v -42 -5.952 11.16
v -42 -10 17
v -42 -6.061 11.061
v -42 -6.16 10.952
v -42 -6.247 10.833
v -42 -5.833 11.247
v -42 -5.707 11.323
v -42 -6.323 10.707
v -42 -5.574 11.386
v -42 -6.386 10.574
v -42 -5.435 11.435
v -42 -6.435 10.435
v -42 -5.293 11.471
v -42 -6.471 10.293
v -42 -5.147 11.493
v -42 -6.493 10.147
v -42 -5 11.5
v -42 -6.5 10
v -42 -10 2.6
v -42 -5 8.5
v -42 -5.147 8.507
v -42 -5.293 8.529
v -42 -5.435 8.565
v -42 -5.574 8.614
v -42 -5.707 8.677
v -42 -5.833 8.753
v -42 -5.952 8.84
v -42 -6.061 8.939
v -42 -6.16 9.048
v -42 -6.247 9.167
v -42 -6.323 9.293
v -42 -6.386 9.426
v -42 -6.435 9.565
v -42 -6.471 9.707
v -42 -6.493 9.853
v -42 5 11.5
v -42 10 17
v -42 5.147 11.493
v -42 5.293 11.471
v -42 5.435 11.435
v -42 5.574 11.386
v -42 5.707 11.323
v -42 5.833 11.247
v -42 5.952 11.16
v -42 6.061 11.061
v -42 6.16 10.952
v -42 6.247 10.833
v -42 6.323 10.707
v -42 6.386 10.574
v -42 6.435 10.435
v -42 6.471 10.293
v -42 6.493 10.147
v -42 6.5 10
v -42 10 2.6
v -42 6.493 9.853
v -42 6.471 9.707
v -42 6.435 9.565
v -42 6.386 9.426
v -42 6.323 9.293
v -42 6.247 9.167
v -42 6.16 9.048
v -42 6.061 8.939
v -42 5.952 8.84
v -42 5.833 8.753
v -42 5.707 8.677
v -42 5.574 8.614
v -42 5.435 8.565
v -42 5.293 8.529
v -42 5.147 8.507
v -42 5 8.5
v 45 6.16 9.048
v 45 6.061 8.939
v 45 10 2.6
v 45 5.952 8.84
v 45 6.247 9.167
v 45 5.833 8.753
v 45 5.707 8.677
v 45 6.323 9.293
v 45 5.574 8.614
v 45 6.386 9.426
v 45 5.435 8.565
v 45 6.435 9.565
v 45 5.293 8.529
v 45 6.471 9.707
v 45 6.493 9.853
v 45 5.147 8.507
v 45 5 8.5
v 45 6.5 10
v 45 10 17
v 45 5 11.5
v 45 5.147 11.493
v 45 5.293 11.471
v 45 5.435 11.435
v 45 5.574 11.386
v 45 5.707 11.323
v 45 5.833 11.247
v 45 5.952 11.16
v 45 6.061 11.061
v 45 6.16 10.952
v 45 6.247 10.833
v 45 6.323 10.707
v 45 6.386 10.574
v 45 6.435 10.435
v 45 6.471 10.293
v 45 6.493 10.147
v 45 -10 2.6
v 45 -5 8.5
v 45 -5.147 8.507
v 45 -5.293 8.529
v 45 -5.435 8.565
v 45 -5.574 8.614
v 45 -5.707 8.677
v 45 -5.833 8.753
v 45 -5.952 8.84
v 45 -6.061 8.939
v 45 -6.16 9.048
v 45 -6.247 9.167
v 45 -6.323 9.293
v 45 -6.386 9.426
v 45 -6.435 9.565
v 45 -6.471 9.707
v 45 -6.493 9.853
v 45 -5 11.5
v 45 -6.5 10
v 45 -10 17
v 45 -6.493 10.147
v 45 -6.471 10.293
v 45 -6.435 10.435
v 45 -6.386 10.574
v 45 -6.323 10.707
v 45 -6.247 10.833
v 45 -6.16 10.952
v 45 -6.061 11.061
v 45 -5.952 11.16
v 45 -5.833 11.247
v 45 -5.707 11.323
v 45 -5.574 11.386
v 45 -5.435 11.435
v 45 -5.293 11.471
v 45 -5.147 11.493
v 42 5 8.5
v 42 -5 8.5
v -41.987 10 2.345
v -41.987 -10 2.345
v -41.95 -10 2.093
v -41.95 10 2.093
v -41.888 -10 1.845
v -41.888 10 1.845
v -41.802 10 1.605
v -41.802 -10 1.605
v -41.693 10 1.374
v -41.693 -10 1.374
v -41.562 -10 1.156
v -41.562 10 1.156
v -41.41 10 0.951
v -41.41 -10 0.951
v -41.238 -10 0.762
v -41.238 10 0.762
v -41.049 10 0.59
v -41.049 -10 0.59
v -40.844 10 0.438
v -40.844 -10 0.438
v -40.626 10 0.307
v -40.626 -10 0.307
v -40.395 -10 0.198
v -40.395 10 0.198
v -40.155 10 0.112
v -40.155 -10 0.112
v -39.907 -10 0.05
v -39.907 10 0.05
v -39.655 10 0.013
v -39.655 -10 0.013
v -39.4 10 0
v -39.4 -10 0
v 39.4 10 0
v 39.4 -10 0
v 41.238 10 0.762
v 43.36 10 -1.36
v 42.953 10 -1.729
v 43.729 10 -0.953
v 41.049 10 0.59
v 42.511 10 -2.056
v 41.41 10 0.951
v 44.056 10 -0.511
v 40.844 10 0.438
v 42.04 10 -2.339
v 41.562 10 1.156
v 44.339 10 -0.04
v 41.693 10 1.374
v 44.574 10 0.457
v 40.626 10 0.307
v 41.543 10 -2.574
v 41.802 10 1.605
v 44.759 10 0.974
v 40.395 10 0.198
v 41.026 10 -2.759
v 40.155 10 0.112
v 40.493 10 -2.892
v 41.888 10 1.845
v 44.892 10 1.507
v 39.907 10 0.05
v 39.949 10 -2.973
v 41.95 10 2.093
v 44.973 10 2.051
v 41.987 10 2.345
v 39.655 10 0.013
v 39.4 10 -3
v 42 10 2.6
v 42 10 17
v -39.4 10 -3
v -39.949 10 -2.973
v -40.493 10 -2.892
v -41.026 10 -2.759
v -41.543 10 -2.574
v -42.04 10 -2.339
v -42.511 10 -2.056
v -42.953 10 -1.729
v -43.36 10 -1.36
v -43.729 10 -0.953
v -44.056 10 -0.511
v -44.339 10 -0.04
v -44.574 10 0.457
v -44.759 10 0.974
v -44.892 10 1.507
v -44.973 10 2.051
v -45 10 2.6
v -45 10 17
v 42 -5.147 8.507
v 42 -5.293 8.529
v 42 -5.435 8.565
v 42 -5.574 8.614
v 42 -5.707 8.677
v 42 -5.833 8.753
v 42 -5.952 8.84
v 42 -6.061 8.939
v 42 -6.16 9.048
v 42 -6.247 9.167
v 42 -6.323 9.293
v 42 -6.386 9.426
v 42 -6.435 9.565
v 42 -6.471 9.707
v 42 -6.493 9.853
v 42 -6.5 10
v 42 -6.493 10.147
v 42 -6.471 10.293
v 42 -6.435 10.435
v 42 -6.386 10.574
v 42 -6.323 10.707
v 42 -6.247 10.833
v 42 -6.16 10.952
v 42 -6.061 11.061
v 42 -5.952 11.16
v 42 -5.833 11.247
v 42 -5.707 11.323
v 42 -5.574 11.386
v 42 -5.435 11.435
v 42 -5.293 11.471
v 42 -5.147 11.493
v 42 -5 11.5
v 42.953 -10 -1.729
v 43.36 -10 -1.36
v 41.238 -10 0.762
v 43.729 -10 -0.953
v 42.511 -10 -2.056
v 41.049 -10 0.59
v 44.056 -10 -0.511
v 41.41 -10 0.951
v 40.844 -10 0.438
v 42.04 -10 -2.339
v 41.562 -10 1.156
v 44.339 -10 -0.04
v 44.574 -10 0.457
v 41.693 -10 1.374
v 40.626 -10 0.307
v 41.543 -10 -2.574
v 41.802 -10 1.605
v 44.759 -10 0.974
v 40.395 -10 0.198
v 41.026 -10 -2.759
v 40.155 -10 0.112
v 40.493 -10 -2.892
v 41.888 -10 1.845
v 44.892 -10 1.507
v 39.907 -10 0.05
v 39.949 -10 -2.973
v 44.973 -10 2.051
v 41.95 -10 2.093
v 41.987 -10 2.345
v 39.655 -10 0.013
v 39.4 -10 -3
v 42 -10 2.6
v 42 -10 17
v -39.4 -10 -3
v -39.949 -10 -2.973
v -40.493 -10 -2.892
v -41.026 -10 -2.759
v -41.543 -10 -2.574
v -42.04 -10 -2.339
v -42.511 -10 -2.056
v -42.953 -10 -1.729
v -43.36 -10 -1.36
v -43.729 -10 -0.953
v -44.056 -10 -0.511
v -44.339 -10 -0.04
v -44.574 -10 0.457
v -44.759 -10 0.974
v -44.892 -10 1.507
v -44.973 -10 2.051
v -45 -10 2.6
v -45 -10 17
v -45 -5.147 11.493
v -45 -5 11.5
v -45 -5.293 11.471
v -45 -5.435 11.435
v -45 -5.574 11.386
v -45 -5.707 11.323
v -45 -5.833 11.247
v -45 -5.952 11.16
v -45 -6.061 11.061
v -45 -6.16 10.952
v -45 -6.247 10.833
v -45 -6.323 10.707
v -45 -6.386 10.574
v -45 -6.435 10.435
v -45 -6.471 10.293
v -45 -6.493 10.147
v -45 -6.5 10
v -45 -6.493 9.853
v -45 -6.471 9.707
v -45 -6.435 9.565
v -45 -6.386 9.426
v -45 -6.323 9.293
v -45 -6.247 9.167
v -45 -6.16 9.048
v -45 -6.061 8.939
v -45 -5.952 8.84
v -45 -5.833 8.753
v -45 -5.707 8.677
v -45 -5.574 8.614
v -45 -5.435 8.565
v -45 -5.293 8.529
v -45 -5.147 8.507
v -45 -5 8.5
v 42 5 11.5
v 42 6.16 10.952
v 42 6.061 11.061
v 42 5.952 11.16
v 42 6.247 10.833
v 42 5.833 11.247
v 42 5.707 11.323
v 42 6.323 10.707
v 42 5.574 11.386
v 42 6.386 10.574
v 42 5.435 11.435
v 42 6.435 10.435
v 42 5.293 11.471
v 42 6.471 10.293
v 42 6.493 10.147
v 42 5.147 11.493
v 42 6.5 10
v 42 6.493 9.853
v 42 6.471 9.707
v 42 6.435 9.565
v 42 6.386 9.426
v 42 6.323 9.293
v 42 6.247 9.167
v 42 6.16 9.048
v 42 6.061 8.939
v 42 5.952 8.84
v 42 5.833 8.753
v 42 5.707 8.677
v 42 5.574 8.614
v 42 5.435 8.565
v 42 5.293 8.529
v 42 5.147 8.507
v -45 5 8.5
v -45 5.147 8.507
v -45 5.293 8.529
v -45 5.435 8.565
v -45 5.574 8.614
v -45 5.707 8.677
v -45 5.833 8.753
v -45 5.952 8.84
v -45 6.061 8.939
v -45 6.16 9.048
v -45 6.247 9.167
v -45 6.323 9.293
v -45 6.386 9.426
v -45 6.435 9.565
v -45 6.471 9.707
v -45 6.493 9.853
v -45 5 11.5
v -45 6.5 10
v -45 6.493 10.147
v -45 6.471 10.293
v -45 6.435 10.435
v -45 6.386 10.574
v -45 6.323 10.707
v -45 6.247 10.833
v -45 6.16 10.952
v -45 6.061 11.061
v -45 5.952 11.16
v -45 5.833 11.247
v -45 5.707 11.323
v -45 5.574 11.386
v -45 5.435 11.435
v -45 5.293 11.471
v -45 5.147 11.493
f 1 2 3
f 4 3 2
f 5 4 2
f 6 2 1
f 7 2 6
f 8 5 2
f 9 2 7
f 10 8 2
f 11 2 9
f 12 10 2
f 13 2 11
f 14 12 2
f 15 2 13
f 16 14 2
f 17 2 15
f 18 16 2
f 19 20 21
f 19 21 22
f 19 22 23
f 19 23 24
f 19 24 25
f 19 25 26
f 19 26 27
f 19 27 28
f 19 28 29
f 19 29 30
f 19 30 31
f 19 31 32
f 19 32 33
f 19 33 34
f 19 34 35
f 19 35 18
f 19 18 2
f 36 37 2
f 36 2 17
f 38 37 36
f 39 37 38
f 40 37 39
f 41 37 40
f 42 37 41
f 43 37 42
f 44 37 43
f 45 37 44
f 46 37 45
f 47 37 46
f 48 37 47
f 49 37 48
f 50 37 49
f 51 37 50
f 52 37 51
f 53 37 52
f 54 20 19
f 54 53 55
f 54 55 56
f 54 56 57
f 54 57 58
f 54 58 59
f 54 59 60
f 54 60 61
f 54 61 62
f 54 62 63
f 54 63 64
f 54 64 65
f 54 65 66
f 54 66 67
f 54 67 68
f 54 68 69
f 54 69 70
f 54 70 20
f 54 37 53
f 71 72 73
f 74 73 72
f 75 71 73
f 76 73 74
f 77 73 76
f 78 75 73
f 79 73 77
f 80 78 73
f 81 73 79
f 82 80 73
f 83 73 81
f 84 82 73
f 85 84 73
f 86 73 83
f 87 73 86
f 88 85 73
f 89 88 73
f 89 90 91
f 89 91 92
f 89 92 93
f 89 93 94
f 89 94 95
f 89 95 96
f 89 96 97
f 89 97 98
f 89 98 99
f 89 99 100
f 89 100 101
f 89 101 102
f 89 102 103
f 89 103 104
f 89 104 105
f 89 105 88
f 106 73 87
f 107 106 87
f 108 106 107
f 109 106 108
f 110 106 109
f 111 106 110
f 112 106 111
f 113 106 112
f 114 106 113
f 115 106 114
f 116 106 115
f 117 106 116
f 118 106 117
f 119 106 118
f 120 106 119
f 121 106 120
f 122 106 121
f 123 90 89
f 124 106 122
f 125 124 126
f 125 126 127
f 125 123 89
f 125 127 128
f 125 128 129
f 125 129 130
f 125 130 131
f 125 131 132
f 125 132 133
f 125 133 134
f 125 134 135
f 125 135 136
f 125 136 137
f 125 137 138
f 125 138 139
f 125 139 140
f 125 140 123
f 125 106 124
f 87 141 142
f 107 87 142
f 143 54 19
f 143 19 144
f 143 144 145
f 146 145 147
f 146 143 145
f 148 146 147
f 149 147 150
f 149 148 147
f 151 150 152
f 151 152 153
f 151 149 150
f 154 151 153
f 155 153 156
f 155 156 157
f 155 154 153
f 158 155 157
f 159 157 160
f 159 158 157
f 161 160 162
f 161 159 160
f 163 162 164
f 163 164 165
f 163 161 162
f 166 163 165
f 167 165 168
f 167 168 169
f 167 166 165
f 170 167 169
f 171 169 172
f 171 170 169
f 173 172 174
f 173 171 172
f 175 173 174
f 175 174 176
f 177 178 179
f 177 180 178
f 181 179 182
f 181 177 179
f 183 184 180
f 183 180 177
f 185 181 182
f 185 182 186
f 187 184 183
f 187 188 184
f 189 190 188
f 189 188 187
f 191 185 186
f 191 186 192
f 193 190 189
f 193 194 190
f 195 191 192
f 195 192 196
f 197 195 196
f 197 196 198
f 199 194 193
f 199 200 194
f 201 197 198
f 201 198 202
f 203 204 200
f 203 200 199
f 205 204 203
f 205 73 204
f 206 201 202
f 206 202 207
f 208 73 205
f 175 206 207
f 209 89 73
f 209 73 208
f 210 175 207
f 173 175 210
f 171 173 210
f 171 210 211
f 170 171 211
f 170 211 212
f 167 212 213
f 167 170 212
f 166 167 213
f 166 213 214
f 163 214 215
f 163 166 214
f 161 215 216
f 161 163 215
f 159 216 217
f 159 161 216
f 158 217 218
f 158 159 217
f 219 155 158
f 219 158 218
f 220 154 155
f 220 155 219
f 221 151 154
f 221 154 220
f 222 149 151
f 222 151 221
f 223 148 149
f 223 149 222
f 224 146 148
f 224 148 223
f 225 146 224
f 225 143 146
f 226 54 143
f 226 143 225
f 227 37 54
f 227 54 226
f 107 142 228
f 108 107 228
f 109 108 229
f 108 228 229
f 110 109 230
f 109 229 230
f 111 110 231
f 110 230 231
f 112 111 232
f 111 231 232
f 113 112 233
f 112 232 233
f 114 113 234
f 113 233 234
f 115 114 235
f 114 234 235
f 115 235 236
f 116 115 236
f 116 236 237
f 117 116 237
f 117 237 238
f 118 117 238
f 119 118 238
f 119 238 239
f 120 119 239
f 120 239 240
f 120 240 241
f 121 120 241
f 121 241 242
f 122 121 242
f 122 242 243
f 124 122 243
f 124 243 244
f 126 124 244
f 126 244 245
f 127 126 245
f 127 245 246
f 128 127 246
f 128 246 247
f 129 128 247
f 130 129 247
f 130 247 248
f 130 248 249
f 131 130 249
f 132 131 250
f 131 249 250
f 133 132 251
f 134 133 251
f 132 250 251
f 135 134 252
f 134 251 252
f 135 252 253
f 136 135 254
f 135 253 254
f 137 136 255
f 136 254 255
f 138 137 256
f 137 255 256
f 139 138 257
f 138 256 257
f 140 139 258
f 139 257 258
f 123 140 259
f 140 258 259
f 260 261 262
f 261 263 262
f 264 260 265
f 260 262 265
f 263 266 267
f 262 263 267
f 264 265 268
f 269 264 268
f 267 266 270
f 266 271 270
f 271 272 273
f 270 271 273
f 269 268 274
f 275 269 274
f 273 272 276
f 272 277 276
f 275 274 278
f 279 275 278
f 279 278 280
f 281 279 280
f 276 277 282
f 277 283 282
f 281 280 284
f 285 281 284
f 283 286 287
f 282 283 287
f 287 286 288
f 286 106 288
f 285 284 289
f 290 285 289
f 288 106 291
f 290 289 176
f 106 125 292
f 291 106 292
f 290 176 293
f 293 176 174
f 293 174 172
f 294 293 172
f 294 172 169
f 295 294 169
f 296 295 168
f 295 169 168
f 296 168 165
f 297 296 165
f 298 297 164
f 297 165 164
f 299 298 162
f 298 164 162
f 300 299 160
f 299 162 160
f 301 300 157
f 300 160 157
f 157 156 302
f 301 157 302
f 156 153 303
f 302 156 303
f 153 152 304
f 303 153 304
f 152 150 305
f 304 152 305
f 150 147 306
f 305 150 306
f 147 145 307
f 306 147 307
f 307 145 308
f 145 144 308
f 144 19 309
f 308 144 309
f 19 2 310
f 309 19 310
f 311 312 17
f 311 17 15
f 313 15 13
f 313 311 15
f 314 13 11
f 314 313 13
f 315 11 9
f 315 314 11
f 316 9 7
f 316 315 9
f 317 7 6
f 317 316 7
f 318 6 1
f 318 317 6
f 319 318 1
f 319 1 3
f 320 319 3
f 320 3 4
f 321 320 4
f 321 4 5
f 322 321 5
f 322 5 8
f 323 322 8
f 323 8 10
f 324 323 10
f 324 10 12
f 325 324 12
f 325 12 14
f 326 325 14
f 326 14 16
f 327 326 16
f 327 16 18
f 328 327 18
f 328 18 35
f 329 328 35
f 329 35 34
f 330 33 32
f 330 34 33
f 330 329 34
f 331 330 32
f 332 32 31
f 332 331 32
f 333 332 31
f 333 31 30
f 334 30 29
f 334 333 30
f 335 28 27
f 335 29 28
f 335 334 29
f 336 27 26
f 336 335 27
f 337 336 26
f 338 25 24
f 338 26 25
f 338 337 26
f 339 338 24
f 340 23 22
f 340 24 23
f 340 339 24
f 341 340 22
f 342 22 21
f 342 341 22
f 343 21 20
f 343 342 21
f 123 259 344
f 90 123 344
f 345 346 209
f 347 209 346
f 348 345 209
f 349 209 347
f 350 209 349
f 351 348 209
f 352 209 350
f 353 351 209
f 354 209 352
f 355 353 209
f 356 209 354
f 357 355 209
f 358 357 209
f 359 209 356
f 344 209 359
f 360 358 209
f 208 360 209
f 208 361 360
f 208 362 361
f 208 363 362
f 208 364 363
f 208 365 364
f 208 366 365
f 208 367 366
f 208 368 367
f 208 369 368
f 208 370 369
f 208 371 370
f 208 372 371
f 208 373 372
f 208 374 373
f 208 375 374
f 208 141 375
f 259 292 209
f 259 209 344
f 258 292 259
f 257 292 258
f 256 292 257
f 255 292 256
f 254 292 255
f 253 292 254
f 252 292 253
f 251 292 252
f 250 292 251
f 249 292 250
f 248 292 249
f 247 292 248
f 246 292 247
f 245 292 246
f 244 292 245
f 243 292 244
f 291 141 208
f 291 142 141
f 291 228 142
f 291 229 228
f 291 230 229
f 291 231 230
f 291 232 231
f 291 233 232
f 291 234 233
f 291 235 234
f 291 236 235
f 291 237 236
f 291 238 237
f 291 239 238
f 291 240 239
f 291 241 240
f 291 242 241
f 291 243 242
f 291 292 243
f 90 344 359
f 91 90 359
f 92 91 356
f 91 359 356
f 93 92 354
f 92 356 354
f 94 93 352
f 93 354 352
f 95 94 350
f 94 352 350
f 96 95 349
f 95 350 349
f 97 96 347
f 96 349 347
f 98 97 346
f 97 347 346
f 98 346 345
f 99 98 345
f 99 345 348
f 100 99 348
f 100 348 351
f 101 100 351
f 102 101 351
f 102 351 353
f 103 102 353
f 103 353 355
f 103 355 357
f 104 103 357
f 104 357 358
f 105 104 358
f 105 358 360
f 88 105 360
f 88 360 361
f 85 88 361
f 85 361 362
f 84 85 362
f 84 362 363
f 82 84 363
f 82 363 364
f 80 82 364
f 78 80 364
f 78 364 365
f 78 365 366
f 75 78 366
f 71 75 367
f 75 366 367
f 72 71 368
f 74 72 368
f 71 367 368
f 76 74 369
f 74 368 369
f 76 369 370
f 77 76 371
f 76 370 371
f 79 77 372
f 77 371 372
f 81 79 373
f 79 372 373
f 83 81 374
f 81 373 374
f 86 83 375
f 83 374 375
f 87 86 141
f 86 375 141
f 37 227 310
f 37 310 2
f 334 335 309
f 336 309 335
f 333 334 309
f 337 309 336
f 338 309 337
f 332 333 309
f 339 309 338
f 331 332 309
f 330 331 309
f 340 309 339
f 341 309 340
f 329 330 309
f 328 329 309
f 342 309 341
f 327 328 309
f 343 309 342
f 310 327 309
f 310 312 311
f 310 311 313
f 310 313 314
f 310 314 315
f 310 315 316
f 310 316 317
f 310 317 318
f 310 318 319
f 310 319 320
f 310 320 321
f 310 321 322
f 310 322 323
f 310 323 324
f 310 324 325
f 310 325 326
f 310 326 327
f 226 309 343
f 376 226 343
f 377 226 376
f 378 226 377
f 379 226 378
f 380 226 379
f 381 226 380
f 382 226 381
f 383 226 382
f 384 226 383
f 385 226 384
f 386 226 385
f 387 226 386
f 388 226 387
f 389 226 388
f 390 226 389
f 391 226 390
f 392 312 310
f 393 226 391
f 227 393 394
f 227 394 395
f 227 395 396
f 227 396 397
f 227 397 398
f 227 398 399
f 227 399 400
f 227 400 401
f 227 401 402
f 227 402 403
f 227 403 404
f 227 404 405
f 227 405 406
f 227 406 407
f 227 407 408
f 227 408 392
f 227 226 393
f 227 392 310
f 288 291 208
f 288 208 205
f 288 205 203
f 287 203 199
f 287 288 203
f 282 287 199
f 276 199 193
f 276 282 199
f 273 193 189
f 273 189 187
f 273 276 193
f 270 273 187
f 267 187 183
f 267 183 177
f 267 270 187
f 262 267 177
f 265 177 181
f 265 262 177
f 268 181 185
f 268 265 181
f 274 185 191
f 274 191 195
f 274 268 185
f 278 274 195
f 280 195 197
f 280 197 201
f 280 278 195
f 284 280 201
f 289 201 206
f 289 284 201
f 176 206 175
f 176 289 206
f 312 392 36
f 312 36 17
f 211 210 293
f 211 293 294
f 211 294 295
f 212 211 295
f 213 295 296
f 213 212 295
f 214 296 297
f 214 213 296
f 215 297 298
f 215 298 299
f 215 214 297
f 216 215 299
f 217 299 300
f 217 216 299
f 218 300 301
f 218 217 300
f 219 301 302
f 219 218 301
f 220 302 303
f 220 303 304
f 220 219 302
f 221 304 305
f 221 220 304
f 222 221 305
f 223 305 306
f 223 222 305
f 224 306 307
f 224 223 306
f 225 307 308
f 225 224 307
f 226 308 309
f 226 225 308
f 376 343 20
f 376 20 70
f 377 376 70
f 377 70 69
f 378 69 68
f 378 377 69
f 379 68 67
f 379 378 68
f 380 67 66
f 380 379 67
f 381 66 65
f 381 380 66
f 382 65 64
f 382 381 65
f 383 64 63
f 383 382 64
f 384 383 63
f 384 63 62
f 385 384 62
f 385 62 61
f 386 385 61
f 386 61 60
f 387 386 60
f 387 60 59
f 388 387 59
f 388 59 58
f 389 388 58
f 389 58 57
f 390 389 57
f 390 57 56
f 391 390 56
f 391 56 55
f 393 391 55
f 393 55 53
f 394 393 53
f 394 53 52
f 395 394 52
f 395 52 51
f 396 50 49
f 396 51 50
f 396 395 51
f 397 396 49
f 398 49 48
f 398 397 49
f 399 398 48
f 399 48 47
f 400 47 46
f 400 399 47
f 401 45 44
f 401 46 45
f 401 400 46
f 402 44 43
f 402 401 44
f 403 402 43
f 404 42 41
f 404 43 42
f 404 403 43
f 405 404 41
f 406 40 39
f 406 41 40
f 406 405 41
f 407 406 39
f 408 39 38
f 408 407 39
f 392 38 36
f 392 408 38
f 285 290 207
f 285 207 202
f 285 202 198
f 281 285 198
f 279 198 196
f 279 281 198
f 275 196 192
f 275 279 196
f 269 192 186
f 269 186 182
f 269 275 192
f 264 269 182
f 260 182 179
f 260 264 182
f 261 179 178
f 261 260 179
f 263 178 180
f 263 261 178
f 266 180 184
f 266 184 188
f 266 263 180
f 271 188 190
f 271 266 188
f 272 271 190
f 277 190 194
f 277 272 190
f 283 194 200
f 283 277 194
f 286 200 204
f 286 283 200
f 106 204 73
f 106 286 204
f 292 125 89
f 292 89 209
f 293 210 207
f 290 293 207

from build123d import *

# Parameters (mm, degrees)
SKETCH1_W                      = 90
SKETCH1_H                      = 20
BASE_FLANGE1_DEPTH             = 3
EDGE_FLANGE1_STRIP_W           = 17.2
EDGE_FLANGE1_STRIP_H           = 3
EDGE_FLANGE1_STRIP_CUT_DEPTH   = 20
EDGE_FLANGE1_STRIP_2_W         = 17.2
EDGE_FLANGE1_STRIP_2_H         = 3
EDGE_FLANGE1_STRIP_CUT_2_DEPTH = 20
EDGE_FLANGE1_DEPTH             = 20
EDGE_FLANGE1_BEND_DEPTH        = 20
CUT_EXTRUDE1_DEPTH             = 10
CUT_EXTRUDE2_START             = -10
CUT_EXTRUDE2_DEPTH             = 10


# Sheet-metal steps are written as plain solids
with BuildPart() as part:
    # Sketch1 → Base-Flange1 (new body)
    with BuildSketch(Plane.XY):
        Rectangle(SKETCH1_W, SKETCH1_H)
    extrude(amount=-BASE_FLANGE1_DEPTH)

    # Edge-Flange1 strip (across the edge) → Edge-Flange1 strip cut (cut)
    with BuildSketch(Plane(origin=(45, -10, 0), x_dir=(-1, 0, 0), z_dir=(0, 1, 0))):
        with Locations((-3, -1.5)):
            Rectangle(EDGE_FLANGE1_STRIP_W, EDGE_FLANGE1_STRIP_H)
    extrude(amount=EDGE_FLANGE1_STRIP_CUT_DEPTH, mode=Mode.SUBTRACT)

    # Edge-Flange1 strip 2 (across the edge) → Edge-Flange1 strip cut 2 (cut)
    with BuildSketch(Plane(origin=(-45, 10, 0), x_dir=(1, 0, 0), z_dir=(0, -1, 0))):
        with Locations((-3, -1.5)):
            Rectangle(EDGE_FLANGE1_STRIP_2_W, EDGE_FLANGE1_STRIP_2_H)
    extrude(amount=EDGE_FLANGE1_STRIP_CUT_2_DEPTH, mode=Mode.SUBTRACT)

    # Edge-Flange1 section (across the edge) → Edge-Flange1 (add)
    with BuildSketch(Plane(origin=(45, -10, 0), x_dir=(-1, 0, 0), z_dir=(0, 1, 0))):
        with BuildLine():
            Line((0, 2.6), (0, 17))
            Line((0, 17), (3, 17))
            Line((3, 17), (3, 2.6))
            ThreePointArc((3, 2.6), (3.761522369, 0.761522369), (5.6, 0))
            Line((5.6, 0), (5.6, -3))
            ThreePointArc((5.6, -3), (1.640202025, -1.359797975), (0, 2.6))
        make_face()
    extrude(amount=EDGE_FLANGE1_DEPTH)

    # Edge-Flange1 section 2 (across the edge) → Edge-Flange1 bend (add)
    with BuildSketch(Plane(origin=(-45, 10, 0), x_dir=(1, 0, 0), z_dir=(0, -1, 0))):
        with BuildLine():
            Line((0, 2.6), (0, 17))
            Line((0, 17), (3, 17))
            Line((3, 17), (3, 2.6))
            ThreePointArc((3, 2.6), (3.761522369, 0.761522369), (5.6, 0))
            Line((5.6, 0), (5.6, -3))
            ThreePointArc((5.6, -3), (1.640202025, -1.359797975), (0, 2.6))
        make_face()
    extrude(amount=EDGE_FLANGE1_BEND_DEPTH)

    # Sketch12 → Cut-Extrude1 (cut)
    with BuildSketch(Plane.ZY.offset(45)):
        with BuildLine():
            Line((11.5, 5), (11.5, -5))
            ThreePointArc((11.5, -5), (10, -6.5), (8.5, -5))
            Line((8.5, -5), (8.5, 5))
            ThreePointArc((8.5, 5), (10, 6.5), (11.5, 5))
        make_face()
    extrude(amount=-CUT_EXTRUDE1_DEPTH, mode=Mode.SUBTRACT)

    # Sketch13 → Cut-Extrude2 (cut)
    with BuildSketch(Plane(origin=(45, 0, 0), x_dir=(0, 0, -1), z_dir=(1, 0, 0)).offset(CUT_EXTRUDE2_START)):
        with BuildLine():
            Line((-8.5, 5), (-8.5, -5))
            ThreePointArc((-8.5, -5), (-10, -6.5), (-11.5, -5))
            Line((-11.5, -5), (-11.5, 5))
            ThreePointArc((-11.5, 5), (-10, 6.5), (-8.5, 5))
        make_face()
    extrude(amount=CUT_EXTRUDE2_DEPTH, mode=Mode.SUBTRACT)


solid = part.part
